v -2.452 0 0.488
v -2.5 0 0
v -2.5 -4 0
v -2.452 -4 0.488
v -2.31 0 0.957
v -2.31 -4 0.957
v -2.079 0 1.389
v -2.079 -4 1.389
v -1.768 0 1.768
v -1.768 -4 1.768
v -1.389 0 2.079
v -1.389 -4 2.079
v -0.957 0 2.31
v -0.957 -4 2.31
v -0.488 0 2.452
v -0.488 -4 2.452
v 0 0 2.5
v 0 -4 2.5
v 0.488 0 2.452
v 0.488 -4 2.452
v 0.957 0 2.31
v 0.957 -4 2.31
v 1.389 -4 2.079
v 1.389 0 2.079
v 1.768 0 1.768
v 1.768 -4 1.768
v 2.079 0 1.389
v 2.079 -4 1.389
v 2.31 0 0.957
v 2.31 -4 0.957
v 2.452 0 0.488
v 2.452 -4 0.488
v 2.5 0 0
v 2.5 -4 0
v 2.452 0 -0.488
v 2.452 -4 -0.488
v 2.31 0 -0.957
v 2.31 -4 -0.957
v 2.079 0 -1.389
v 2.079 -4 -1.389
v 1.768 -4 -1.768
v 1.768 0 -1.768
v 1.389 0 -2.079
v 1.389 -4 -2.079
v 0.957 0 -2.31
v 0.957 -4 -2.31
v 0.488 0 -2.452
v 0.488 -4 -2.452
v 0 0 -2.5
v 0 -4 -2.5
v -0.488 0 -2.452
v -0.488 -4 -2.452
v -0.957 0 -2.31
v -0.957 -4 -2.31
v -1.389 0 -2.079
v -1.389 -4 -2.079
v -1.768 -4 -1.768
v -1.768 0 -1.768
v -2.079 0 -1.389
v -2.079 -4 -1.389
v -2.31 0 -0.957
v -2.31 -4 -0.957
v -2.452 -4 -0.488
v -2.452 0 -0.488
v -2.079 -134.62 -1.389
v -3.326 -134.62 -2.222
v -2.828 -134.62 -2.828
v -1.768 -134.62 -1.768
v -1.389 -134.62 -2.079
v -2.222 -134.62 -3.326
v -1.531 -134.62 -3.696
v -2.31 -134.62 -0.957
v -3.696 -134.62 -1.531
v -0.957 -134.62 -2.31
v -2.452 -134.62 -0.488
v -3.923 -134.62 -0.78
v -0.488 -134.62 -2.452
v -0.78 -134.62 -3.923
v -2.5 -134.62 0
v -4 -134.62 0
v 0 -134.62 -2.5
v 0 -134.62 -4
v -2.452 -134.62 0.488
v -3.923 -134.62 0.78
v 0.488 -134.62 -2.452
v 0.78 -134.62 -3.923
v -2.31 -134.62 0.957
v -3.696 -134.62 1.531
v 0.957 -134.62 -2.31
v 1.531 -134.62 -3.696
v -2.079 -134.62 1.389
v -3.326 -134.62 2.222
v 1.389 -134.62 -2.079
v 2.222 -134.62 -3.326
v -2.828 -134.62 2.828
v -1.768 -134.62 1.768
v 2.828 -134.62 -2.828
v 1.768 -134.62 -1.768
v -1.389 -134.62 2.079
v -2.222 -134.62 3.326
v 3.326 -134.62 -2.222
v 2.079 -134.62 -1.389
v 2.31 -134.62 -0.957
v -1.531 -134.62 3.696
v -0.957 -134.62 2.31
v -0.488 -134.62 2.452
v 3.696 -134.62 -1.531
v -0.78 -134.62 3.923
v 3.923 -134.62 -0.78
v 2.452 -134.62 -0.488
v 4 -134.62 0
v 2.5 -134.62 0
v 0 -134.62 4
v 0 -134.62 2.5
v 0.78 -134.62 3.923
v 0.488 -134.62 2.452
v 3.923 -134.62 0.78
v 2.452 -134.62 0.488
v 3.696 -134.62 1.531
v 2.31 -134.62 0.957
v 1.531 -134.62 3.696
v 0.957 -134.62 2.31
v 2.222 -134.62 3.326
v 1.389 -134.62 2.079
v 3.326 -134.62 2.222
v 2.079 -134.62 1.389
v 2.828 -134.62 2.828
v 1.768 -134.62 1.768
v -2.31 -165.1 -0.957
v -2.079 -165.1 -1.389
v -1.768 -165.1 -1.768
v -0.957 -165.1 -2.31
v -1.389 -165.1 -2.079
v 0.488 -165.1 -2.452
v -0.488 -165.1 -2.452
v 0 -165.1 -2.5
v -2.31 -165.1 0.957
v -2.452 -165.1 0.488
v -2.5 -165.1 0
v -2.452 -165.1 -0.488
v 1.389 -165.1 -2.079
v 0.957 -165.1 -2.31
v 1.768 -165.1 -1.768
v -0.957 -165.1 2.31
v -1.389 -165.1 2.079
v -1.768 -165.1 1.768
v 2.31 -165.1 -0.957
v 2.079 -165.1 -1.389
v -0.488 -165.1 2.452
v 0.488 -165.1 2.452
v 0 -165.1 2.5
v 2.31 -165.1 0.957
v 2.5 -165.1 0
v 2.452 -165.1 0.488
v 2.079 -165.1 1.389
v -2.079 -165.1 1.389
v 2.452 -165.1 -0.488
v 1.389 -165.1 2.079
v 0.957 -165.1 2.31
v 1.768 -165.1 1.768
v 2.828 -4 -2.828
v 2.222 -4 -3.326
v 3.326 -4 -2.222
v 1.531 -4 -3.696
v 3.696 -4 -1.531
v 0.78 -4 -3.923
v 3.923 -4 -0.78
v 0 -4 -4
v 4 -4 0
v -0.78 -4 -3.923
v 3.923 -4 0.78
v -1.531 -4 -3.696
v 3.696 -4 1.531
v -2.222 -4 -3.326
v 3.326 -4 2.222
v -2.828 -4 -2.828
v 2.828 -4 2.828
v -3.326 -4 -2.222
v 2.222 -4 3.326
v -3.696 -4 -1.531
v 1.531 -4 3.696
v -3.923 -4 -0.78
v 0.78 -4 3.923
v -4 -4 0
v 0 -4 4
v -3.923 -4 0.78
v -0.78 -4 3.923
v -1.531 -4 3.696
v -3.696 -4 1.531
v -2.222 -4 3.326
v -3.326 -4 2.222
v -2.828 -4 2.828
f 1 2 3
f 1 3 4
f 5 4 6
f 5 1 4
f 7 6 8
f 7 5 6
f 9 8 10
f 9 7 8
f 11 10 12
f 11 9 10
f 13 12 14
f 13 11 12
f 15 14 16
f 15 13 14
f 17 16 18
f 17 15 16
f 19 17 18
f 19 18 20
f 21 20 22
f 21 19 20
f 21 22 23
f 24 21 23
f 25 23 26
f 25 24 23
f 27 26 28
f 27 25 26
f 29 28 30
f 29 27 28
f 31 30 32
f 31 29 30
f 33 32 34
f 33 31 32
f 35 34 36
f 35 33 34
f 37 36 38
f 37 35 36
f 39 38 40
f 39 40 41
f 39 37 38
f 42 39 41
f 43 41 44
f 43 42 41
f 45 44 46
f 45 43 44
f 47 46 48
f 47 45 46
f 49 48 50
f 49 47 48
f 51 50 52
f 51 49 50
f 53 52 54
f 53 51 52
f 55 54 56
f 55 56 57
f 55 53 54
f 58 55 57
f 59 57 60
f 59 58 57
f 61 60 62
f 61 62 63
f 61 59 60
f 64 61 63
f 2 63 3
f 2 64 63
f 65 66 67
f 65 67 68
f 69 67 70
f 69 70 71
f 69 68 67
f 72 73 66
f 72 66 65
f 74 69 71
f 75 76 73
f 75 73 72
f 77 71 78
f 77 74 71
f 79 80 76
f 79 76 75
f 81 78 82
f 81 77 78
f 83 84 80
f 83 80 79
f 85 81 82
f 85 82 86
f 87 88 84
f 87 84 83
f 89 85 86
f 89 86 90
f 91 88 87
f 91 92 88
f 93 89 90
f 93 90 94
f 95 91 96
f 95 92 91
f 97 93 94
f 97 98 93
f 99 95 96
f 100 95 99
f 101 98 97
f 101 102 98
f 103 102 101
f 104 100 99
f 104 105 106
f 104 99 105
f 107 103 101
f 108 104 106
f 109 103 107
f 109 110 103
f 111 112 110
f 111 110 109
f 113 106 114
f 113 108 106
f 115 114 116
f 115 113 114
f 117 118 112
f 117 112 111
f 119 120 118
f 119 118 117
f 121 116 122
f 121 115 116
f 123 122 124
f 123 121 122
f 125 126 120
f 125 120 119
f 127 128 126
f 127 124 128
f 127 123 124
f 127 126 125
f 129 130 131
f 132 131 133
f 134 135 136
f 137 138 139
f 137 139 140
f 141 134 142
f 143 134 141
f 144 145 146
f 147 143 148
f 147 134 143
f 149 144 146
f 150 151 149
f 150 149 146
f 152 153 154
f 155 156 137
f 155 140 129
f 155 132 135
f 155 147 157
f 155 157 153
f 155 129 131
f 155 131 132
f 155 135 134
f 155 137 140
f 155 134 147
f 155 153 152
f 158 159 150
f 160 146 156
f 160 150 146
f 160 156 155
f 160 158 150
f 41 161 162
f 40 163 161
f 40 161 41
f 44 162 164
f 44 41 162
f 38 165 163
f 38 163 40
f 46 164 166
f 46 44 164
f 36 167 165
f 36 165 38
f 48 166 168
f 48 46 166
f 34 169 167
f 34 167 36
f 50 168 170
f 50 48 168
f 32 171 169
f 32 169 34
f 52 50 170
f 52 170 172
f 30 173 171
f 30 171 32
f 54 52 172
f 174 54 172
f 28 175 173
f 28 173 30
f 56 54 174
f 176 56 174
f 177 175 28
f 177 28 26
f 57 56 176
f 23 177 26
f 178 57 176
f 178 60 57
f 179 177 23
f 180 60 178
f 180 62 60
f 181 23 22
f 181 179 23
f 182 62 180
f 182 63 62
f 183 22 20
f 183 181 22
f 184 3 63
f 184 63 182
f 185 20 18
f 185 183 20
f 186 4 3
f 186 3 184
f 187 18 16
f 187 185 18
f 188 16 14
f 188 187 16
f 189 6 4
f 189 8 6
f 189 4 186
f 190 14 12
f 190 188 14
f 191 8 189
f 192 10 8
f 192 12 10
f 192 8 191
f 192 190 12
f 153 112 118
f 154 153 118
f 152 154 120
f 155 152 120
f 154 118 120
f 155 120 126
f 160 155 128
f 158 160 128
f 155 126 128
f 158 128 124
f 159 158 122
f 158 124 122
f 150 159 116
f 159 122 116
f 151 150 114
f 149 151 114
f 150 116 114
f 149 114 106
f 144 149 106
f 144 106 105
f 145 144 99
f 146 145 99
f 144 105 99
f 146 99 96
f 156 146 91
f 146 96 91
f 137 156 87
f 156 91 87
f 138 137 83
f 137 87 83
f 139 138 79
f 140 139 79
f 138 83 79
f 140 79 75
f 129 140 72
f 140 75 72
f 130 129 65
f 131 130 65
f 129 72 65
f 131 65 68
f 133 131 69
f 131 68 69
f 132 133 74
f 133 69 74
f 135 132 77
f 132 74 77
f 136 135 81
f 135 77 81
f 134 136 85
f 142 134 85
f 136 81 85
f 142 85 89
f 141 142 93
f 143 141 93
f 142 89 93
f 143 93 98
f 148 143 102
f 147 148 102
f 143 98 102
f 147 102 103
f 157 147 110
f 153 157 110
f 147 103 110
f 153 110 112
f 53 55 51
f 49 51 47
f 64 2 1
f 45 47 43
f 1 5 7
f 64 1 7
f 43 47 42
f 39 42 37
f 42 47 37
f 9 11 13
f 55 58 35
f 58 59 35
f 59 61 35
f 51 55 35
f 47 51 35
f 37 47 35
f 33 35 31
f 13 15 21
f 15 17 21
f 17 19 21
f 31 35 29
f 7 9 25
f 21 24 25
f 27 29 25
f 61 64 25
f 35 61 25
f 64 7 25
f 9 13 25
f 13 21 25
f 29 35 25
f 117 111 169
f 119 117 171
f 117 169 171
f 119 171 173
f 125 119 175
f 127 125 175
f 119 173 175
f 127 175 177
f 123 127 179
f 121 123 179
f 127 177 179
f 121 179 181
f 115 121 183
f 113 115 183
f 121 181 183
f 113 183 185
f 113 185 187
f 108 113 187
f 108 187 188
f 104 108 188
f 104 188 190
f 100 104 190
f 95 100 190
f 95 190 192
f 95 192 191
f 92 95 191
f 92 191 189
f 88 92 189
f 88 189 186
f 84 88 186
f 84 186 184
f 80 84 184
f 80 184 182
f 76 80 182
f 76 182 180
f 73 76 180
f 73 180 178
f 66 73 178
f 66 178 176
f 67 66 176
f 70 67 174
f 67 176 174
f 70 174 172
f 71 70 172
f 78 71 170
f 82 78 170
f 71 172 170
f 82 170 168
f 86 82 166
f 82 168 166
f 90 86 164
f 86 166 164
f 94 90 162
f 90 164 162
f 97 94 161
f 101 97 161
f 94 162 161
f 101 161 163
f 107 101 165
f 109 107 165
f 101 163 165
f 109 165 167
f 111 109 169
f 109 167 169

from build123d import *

# Parameters (mm, degrees)
F0_R     = 4
F1_DEPTH = 134.62
F2_R     = 4
F2_R_2   = 2.5
F3_DEPTH = 4
F4_R     = 2.5
F5_DEPTH = 30.48


with BuildPart() as f1:
    # F0 (on Front) → F1 (new body)
    with BuildSketch(Plane.XZ):
        Circle(F0_R)
    extrude(amount=F1_DEPTH)

    # F2 (on face) → F3 (cut)
    with BuildSketch(Plane(origin=(0, 0, 0), x_dir=(-1, 0, 0), z_dir=(0, 1, 0))):
        Circle(F2_R)
        Circle(F2_R_2, mode=Mode.SUBTRACT)
    extrude(amount=-F3_DEPTH, mode=Mode.SUBTRACT)

    # F4 (on face) → F5 (join)
    with BuildSketch(Plane.XZ.offset(134.62)):
        Circle(F4_R)
    extrude(amount=F5_DEPTH)


solid = f1.part
